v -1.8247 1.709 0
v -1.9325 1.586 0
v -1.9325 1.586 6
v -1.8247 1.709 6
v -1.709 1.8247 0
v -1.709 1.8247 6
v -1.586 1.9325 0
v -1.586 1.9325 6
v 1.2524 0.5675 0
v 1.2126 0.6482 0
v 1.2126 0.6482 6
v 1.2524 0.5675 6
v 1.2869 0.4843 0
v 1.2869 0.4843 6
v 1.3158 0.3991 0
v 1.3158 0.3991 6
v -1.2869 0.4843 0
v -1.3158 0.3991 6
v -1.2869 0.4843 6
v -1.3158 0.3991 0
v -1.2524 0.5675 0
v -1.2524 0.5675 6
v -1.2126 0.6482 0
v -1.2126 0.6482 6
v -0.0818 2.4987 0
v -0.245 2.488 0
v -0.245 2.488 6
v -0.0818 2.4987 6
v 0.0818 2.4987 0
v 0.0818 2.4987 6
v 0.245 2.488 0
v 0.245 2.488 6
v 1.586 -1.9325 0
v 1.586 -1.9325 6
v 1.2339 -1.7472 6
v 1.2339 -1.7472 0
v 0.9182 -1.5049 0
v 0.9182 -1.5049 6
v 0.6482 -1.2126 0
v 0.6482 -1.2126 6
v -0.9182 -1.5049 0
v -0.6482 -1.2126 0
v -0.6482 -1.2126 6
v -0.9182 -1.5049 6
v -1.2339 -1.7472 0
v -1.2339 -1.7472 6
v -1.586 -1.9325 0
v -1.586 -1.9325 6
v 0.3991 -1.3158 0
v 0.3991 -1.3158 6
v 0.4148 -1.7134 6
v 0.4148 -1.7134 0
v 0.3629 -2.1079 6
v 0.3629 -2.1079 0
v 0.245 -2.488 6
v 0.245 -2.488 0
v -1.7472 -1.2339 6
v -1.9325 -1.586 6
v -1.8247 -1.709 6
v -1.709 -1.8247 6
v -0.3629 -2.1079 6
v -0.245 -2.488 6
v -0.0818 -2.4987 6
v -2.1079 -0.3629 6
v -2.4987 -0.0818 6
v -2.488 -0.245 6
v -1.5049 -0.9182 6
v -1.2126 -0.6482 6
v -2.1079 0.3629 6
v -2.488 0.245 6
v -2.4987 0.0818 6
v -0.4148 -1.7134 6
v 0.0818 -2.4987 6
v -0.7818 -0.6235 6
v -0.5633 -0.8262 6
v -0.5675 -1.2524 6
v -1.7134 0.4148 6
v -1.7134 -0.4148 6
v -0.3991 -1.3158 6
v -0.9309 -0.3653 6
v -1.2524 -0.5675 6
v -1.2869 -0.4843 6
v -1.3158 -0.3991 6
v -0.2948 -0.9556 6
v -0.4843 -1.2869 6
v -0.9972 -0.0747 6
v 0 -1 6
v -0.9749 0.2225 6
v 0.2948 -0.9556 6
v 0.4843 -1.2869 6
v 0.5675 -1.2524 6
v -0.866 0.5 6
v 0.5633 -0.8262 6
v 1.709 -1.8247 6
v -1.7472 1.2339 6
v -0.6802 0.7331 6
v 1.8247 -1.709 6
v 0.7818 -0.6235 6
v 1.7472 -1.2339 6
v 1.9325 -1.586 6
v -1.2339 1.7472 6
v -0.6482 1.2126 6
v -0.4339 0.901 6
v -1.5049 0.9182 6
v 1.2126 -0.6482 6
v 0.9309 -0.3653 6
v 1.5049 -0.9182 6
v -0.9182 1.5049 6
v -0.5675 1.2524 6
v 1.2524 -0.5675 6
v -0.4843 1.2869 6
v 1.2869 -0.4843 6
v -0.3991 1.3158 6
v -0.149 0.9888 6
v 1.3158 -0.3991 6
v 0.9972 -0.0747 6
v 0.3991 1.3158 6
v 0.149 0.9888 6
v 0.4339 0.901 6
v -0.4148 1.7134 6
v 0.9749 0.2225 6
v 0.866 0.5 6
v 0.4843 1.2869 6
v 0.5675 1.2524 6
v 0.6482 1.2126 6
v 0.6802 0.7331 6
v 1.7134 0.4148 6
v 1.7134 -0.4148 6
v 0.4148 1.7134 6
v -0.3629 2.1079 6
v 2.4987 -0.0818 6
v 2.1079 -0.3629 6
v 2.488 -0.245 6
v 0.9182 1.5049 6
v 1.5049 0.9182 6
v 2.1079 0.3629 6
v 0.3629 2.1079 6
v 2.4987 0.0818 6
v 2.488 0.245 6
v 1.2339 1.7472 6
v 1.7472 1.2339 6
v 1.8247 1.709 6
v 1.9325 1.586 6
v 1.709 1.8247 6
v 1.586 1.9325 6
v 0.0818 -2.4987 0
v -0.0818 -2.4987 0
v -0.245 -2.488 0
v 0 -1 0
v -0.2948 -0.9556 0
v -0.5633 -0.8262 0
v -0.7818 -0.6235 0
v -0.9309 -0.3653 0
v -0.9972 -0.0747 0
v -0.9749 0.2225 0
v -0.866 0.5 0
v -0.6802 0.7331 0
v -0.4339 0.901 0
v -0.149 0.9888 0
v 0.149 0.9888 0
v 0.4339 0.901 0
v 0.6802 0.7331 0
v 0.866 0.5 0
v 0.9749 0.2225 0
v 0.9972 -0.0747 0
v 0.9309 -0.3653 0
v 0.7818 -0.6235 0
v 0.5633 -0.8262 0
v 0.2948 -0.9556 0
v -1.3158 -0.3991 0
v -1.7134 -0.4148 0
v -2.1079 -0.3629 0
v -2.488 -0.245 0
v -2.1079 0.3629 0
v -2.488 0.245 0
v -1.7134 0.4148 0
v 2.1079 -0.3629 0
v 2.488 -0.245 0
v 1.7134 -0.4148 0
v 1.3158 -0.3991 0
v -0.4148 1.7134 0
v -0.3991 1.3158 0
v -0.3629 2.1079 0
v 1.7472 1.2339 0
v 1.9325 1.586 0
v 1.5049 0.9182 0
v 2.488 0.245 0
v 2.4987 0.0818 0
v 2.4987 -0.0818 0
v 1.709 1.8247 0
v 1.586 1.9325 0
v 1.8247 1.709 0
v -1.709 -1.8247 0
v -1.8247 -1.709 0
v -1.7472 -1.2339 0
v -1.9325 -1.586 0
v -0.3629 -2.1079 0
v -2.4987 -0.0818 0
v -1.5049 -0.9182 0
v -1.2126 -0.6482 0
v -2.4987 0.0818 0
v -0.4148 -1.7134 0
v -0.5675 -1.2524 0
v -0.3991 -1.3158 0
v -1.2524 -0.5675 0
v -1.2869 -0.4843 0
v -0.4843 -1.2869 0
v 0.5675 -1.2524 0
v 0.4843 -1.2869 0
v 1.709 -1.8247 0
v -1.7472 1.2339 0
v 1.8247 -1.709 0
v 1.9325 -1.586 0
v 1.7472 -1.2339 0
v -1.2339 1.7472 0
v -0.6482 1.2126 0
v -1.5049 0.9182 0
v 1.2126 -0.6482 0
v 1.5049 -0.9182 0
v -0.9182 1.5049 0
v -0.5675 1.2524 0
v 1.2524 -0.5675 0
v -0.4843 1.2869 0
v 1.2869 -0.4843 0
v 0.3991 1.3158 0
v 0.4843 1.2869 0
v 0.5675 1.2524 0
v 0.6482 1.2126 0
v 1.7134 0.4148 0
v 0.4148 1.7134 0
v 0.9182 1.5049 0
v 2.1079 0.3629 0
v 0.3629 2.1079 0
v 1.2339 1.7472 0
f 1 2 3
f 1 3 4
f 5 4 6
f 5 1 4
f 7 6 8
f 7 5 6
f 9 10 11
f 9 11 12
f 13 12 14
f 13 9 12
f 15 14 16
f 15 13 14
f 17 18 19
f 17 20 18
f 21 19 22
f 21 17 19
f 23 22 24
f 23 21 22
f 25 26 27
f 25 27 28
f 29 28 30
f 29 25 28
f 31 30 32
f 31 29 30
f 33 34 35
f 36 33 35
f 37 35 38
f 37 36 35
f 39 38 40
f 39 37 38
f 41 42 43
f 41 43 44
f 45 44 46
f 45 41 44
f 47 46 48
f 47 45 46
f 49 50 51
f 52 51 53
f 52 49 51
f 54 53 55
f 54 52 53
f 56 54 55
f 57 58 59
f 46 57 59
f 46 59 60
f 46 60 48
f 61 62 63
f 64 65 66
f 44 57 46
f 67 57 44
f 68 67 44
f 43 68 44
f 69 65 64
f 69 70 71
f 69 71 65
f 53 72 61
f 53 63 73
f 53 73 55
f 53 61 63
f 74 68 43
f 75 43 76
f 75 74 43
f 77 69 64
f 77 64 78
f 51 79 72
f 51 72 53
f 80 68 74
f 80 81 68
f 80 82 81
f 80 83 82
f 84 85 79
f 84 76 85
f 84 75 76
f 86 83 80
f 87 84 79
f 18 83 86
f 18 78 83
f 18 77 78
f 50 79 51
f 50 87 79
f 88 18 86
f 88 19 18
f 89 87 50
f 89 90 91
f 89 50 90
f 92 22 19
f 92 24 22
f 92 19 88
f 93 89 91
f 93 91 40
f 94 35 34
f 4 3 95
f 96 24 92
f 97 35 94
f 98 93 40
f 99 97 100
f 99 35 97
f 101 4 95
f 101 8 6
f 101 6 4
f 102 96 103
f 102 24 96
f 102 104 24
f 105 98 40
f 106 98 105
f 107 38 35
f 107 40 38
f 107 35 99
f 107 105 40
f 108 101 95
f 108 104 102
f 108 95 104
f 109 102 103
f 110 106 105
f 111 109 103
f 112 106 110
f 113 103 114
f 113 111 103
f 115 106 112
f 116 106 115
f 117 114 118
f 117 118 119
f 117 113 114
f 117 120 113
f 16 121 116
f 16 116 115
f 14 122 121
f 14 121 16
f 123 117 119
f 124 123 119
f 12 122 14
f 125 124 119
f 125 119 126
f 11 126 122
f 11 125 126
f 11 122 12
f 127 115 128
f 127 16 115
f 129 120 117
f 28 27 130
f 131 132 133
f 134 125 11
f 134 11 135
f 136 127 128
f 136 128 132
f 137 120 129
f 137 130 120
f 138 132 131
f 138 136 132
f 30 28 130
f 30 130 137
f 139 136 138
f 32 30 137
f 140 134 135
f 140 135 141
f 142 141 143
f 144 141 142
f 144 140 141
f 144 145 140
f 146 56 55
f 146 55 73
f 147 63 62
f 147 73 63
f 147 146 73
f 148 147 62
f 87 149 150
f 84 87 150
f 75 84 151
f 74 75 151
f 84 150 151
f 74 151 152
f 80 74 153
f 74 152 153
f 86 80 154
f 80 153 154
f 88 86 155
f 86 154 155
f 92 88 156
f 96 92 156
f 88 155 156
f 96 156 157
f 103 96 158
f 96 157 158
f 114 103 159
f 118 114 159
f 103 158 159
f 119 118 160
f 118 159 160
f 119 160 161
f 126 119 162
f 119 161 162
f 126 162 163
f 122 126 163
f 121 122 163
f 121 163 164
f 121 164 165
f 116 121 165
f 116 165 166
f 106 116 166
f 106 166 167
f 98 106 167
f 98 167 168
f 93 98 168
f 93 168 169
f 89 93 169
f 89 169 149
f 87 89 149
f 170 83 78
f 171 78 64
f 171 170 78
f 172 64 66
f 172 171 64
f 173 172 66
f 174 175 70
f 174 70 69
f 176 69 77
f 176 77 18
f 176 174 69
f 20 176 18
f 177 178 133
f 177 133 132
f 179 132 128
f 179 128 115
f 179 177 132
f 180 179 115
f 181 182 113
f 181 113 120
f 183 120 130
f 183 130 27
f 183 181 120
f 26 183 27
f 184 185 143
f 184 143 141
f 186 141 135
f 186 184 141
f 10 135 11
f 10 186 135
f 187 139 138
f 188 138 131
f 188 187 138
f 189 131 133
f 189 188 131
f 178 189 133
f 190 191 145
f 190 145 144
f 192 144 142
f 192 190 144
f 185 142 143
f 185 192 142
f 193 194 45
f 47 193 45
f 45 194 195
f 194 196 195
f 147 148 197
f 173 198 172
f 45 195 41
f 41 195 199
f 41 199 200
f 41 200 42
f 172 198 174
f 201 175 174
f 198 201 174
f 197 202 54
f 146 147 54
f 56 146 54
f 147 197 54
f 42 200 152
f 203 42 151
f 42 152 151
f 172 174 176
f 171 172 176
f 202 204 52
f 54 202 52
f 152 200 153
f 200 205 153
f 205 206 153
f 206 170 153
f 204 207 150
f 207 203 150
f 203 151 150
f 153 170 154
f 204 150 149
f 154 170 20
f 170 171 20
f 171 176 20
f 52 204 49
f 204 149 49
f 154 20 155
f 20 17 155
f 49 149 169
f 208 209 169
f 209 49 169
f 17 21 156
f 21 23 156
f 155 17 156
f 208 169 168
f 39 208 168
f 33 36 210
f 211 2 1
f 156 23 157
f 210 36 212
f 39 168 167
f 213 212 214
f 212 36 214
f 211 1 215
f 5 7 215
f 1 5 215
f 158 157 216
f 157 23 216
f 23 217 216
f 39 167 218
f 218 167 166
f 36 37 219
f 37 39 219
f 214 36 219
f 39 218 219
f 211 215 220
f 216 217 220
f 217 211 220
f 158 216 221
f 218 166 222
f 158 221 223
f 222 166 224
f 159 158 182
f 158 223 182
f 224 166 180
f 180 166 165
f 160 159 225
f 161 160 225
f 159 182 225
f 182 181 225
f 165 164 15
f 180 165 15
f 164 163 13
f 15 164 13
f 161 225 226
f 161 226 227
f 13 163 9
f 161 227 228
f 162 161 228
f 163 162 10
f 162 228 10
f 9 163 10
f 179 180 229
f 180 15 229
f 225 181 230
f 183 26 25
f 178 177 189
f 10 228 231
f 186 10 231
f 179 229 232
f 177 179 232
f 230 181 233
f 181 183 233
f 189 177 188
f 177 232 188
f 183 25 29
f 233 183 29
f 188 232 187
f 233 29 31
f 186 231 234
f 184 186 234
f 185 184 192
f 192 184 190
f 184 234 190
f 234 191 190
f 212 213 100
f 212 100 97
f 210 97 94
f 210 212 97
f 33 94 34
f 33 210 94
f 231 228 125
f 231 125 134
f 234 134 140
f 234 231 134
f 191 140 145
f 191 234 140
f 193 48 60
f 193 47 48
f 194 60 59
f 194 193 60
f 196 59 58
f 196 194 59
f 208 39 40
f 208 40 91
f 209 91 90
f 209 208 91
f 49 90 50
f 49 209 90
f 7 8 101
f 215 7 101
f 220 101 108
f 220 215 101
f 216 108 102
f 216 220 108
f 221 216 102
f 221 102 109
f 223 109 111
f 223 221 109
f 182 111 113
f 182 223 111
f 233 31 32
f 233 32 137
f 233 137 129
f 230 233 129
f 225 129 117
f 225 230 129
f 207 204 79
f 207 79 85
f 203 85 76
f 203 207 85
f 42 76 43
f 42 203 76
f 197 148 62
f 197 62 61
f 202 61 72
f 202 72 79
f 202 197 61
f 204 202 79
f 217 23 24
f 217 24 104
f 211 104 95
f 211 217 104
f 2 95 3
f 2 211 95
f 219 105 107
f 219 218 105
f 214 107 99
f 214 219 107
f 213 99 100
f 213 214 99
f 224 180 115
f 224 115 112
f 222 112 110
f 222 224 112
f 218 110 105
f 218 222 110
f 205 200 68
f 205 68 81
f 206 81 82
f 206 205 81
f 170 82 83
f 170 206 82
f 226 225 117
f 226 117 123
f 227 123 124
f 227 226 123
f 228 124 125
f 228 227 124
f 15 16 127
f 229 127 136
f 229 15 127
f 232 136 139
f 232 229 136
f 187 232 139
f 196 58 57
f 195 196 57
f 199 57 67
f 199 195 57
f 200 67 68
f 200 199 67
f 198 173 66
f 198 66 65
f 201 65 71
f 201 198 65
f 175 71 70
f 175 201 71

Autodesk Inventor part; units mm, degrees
sketch "Sketch1" plane through (0, 0, 0) normal (0, 0, 1) x (1, 0, 0)
  circle A0 centre (0, 0) radius 2.5
  dimension "d0" = 5
extrude "Extrusion1" add sketch "Sketch1" along normal blind 6
ref_plane "Work Plane2" through (0, 0, 3) normal (0, 0, 1) x (1, 0, 0)
sketch "Sketch2" plane through (0, 0, 0) normal (0, 0, -1) x (-1, 0, 0)
  circle A0 centre (0, 0) radius 2.5 projected
  circle A1 centre (0, 0) radius 2
  dimension "d3" = 4
surface extrude "ピッチ円直径" sketch "Sketch2" against normal through all shown no curves A1
ref_plane "Work Plane8" through (0, 0, 0) normal (0.9238795, 0.3826834, 0) x (0, 0, 1)
ref_plane "Work Plane9" through (0, 0, 0) normal (1, 0, 0) x (0, 1, 0)
spur gear teeth "平歯車" teeth 8 pitch diameter 4 tip diameter 5 root diameter 2.75 face width 6 start plane through (0, 0, 0) normal (0, 0, -1) x (-1, 0, 0)
sketch "スケッチ3" plane through (0, 0, 6) normal (0, 0, 1) x (1, 0, 0)
  point P0 (0, 0)
  point P1 (0, 0)
hole "穴1" at (0, 0, 6) direction (0, 0, -1) diameter 2 end through all
equation "\"d0\" = da_da"
equation "\"d1\" = da_b"
equation "\"d3\" = da_dw"
equation "\"d16\" = da_aw"
equation "\"d43\" = da_aw"
equation "\"d46\" = da_aw"
equation "\"da_da\" = 5"
equation "\"da_b\" = 6"
equation "\"da_dw\" = 4"
equation "\"da_aw\" = 4"
properties part number "平歯車1" material "アセタール樹脂、白"
